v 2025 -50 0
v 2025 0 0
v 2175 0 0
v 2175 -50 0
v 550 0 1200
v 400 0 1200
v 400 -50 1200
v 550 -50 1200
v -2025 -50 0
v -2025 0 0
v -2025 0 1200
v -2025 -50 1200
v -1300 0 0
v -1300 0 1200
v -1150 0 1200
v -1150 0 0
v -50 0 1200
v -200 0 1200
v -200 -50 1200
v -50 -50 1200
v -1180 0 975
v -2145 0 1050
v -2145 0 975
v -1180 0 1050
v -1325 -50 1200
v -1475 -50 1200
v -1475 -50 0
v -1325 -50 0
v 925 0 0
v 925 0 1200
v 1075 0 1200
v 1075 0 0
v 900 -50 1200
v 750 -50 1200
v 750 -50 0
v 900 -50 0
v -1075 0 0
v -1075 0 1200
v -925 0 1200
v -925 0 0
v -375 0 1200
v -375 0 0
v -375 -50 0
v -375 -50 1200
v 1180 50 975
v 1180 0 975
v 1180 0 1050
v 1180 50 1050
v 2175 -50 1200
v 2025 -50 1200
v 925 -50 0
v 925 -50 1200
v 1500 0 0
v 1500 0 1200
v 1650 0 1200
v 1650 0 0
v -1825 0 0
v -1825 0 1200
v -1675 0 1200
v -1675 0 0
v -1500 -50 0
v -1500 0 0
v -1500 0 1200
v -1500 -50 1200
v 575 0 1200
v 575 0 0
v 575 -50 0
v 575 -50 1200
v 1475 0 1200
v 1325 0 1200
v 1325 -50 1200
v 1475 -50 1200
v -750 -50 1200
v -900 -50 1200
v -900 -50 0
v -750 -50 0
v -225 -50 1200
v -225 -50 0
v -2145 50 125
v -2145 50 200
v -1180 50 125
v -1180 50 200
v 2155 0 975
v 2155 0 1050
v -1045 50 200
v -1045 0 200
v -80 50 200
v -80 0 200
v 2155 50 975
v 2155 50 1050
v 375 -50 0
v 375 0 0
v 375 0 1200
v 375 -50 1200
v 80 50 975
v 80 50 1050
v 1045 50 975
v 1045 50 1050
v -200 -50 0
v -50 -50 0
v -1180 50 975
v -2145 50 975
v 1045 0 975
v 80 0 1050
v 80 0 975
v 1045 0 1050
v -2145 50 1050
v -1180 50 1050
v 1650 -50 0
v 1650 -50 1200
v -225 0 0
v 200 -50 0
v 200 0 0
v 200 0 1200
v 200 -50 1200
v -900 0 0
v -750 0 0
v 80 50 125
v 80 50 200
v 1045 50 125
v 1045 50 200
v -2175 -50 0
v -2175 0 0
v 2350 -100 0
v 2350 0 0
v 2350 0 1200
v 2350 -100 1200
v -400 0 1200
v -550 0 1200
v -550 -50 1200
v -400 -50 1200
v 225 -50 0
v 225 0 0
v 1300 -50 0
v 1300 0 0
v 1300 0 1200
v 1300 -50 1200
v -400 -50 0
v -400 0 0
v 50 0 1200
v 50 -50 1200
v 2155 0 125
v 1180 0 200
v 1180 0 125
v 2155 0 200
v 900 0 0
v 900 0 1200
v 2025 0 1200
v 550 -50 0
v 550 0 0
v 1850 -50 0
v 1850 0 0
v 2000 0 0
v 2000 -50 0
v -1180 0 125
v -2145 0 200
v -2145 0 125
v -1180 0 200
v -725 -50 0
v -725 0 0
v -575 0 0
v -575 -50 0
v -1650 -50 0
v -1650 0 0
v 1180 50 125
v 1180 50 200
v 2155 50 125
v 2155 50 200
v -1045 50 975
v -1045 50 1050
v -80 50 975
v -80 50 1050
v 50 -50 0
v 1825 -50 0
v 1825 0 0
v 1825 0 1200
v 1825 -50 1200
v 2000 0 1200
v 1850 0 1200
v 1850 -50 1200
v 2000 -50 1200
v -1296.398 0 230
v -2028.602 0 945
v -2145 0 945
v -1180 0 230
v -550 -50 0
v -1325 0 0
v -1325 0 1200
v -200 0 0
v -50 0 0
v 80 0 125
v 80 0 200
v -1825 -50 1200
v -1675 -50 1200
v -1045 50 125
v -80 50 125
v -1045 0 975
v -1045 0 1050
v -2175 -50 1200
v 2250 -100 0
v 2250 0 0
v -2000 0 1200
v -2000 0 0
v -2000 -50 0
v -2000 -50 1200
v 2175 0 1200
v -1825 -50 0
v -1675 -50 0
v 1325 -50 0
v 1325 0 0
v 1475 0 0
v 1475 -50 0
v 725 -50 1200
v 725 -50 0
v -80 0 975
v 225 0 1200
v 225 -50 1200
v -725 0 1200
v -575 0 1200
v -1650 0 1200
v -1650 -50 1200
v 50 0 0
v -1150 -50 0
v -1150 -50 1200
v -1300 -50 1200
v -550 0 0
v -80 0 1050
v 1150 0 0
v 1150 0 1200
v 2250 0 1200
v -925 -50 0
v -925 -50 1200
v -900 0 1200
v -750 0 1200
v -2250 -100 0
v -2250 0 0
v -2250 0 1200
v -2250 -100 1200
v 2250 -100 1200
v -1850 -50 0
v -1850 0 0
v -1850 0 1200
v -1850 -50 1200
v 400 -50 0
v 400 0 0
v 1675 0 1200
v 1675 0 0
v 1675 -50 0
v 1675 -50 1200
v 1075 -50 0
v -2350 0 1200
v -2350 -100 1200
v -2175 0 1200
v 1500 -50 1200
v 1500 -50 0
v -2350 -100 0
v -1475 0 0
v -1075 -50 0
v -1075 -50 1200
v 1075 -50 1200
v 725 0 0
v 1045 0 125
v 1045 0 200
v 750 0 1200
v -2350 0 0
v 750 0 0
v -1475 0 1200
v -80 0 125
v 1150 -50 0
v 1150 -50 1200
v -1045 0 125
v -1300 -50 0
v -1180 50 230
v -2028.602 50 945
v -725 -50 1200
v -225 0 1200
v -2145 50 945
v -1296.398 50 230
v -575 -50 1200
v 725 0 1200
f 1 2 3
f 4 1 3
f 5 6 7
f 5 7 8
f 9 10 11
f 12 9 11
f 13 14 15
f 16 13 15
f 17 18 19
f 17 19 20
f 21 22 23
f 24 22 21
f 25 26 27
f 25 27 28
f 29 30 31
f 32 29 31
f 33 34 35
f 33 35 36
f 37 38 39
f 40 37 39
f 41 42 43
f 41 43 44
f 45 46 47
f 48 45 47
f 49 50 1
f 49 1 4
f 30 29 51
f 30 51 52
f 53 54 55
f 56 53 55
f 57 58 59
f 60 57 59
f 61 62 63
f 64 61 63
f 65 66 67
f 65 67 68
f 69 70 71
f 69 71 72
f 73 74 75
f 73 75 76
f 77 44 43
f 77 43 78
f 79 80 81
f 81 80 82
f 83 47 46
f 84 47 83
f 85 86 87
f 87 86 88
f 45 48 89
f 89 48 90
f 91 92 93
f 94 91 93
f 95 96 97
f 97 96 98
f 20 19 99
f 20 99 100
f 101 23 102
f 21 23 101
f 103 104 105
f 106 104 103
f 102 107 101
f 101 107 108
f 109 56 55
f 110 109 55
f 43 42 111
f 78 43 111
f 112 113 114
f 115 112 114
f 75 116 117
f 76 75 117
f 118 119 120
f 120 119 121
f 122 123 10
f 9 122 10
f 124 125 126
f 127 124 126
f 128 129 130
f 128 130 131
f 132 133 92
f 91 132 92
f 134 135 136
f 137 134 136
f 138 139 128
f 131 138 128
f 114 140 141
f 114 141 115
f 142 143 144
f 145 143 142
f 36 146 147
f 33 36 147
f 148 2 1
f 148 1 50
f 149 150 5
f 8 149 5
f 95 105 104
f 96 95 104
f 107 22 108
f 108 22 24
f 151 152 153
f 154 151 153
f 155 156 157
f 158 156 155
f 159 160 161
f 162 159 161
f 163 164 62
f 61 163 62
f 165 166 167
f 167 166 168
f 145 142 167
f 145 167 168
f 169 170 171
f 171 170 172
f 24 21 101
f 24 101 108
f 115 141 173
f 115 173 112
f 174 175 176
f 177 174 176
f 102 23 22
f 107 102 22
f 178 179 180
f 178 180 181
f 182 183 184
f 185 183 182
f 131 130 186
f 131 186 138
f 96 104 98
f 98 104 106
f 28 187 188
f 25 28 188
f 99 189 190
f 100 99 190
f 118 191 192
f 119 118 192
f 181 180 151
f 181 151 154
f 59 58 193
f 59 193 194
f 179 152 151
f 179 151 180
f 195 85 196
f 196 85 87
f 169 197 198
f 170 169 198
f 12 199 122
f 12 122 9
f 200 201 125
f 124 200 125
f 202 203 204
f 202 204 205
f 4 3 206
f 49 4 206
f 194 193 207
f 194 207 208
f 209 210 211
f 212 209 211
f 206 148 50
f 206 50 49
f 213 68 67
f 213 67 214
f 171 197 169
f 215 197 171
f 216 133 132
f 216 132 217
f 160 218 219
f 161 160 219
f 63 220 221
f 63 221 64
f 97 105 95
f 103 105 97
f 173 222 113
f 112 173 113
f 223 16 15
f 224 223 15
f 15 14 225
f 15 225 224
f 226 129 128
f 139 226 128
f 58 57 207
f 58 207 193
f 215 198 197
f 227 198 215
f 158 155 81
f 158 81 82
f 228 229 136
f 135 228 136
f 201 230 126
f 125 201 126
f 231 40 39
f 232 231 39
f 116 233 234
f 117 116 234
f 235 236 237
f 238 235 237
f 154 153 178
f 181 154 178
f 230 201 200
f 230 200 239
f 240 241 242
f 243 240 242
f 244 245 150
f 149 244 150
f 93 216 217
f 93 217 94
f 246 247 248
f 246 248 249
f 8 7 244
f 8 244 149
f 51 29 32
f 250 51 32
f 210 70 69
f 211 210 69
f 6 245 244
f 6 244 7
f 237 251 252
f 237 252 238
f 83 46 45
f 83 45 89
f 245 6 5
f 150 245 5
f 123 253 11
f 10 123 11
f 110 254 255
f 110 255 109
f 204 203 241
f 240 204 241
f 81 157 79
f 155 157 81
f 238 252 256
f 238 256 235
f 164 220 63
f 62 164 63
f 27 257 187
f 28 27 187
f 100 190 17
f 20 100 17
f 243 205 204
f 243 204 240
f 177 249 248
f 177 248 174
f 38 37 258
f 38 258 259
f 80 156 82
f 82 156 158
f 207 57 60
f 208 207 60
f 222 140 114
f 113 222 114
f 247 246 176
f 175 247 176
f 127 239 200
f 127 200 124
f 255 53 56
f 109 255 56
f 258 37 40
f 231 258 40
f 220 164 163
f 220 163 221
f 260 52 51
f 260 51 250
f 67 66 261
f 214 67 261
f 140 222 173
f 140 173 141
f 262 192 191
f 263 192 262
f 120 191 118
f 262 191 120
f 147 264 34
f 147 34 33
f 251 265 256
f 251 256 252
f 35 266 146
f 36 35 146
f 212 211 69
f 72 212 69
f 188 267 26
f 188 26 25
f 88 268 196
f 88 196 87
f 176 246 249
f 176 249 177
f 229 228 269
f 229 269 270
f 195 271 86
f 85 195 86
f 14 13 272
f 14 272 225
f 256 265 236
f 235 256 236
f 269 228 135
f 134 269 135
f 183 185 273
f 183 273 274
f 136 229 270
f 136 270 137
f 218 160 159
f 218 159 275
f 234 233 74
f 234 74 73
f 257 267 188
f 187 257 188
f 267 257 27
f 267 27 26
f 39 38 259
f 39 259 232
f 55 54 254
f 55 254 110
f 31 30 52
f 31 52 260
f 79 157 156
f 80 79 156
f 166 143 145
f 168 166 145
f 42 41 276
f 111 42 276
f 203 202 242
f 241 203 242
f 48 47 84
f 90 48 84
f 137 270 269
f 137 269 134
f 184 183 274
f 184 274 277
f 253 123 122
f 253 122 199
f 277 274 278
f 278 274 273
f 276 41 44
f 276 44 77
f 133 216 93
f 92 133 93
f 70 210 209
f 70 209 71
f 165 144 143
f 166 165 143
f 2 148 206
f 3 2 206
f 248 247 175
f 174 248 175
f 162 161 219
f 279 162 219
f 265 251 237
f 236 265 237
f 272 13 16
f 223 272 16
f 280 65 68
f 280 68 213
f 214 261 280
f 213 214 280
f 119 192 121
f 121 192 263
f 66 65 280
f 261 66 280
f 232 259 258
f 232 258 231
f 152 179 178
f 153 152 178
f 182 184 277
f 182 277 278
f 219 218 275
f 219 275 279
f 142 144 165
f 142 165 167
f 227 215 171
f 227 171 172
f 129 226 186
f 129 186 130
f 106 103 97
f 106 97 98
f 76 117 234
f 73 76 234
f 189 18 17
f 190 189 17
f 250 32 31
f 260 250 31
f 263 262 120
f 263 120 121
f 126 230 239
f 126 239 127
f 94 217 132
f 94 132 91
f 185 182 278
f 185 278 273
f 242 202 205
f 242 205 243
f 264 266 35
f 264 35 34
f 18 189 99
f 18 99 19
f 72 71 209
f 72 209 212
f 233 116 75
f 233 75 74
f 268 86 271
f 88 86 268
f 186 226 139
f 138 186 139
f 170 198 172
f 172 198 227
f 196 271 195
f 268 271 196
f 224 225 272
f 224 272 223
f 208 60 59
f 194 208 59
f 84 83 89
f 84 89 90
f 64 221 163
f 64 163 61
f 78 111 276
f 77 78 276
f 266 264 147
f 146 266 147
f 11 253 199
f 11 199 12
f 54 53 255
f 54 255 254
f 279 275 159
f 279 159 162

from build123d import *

# Parameters (mm, degrees)
F0_W     = 100
F0_H     = 1200
F1_DEPTH = 100
F2_W     = 150
F2_H     = 1200
F3_DEPTH = 50
F4_W     = 965
F4_H     = 75
F4_W_2   = 975
F5_DEPTH = 50


with BuildPart() as f1:
    # F0 (on Front) → F1 (new body)
    with BuildSketch(Plane.XZ):
        with Locations((-2300, 600)):
            Rectangle(F0_W, F0_H)
        with Locations((2300, 600)):
            Rectangle(F0_W, F0_H)
    extrude(amount=F1_DEPTH)


with BuildPart() as f3:
    # F2 (on Front) → F3 (new body)
    with BuildSketch(Plane.XZ):
        with Locations((-2100, 600)):
            Rectangle(F2_W, F2_H)
        with Locations((-125, 600)):
            Rectangle(F2_W, F2_H)
        with Locations((125, 600)):
            Rectangle(F2_W, F2_H)
        with Locations((2100, 600)):
            Rectangle(F2_W, F2_H)
        with Locations((-1925, 600)):
            Rectangle(F2_W, F2_H)
        with Locations((-1750, 600)):
            Rectangle(F2_W, F2_H)
        with Locations((-1575, 600)):
            Rectangle(F2_W, F2_H)
        with Locations((-1400, 600)):
            Rectangle(F2_W, F2_H)
        with Locations((-1225, 600)):
            Rectangle(F2_W, F2_H)
        with Locations((-300, 600)):
            Rectangle(F2_W, F2_H)
        with Locations((-475, 600)):
            Rectangle(F2_W, F2_H)
        with Locations((-650, 600)):
            Rectangle(F2_W, F2_H)
        with Locations((-825, 600)):
            Rectangle(F2_W, F2_H)
        with Locations((-1000, 600)):
            Rectangle(F2_W, F2_H)
        with Locations((300, 600)):
            Rectangle(F2_W, F2_H)
        with Locations((475, 600)):
            Rectangle(F2_W, F2_H)
        with Locations((650, 600)):
            Rectangle(F2_W, F2_H)
        with Locations((825, 600)):
            Rectangle(F2_W, F2_H)
        with Locations((1000, 600)):
            Rectangle(F2_W, F2_H)
        with Locations((1925, 600)):
            Rectangle(F2_W, F2_H)
        with Locations((1750, 600)):
            Rectangle(F2_W, F2_H)
        with Locations((1575, 600)):
            Rectangle(F2_W, F2_H)
        with Locations((1400, 600)):
            Rectangle(F2_W, F2_H)
        with Locations((1225, 600)):
            Rectangle(F2_W, F2_H)
    extrude(amount=F3_DEPTH)


with BuildPart() as f5:
    # F4 (on Front) → F5 (new body)
    with BuildSketch(Plane.XZ):
        with Locations((-1662.5, 1012.5)):
            Rectangle(F4_W, F4_H)
        with Locations((-562.5, 1012.5)):
            Rectangle(F4_W, F4_H)
        with Locations((562.5, 1012.5)):
            Rectangle(F4_W, F4_H)
        with Locations((1667.5, 1012.5)):
            Rectangle(F4_W_2, F4_H)
        with Locations((1667.5, 162.5)):
            Rectangle(F4_W_2, F4_H)
        with Locations((-1662.5, 162.5)):
            Rectangle(F4_W, F4_H)
        with Locations((-562.5, 162.5)):
            Rectangle(F4_W, F4_H)
        with Locations((562.5, 162.5)):
            Rectangle(F4_W, F4_H)
        Polygon((-1296.39813, 230), (-1180, 230), (-2028.60187, 945), (-2145, 945), align=None)
    extrude(amount=-F5_DEPTH)


solid = Compound([f1.part, f3.part, f5.part])
